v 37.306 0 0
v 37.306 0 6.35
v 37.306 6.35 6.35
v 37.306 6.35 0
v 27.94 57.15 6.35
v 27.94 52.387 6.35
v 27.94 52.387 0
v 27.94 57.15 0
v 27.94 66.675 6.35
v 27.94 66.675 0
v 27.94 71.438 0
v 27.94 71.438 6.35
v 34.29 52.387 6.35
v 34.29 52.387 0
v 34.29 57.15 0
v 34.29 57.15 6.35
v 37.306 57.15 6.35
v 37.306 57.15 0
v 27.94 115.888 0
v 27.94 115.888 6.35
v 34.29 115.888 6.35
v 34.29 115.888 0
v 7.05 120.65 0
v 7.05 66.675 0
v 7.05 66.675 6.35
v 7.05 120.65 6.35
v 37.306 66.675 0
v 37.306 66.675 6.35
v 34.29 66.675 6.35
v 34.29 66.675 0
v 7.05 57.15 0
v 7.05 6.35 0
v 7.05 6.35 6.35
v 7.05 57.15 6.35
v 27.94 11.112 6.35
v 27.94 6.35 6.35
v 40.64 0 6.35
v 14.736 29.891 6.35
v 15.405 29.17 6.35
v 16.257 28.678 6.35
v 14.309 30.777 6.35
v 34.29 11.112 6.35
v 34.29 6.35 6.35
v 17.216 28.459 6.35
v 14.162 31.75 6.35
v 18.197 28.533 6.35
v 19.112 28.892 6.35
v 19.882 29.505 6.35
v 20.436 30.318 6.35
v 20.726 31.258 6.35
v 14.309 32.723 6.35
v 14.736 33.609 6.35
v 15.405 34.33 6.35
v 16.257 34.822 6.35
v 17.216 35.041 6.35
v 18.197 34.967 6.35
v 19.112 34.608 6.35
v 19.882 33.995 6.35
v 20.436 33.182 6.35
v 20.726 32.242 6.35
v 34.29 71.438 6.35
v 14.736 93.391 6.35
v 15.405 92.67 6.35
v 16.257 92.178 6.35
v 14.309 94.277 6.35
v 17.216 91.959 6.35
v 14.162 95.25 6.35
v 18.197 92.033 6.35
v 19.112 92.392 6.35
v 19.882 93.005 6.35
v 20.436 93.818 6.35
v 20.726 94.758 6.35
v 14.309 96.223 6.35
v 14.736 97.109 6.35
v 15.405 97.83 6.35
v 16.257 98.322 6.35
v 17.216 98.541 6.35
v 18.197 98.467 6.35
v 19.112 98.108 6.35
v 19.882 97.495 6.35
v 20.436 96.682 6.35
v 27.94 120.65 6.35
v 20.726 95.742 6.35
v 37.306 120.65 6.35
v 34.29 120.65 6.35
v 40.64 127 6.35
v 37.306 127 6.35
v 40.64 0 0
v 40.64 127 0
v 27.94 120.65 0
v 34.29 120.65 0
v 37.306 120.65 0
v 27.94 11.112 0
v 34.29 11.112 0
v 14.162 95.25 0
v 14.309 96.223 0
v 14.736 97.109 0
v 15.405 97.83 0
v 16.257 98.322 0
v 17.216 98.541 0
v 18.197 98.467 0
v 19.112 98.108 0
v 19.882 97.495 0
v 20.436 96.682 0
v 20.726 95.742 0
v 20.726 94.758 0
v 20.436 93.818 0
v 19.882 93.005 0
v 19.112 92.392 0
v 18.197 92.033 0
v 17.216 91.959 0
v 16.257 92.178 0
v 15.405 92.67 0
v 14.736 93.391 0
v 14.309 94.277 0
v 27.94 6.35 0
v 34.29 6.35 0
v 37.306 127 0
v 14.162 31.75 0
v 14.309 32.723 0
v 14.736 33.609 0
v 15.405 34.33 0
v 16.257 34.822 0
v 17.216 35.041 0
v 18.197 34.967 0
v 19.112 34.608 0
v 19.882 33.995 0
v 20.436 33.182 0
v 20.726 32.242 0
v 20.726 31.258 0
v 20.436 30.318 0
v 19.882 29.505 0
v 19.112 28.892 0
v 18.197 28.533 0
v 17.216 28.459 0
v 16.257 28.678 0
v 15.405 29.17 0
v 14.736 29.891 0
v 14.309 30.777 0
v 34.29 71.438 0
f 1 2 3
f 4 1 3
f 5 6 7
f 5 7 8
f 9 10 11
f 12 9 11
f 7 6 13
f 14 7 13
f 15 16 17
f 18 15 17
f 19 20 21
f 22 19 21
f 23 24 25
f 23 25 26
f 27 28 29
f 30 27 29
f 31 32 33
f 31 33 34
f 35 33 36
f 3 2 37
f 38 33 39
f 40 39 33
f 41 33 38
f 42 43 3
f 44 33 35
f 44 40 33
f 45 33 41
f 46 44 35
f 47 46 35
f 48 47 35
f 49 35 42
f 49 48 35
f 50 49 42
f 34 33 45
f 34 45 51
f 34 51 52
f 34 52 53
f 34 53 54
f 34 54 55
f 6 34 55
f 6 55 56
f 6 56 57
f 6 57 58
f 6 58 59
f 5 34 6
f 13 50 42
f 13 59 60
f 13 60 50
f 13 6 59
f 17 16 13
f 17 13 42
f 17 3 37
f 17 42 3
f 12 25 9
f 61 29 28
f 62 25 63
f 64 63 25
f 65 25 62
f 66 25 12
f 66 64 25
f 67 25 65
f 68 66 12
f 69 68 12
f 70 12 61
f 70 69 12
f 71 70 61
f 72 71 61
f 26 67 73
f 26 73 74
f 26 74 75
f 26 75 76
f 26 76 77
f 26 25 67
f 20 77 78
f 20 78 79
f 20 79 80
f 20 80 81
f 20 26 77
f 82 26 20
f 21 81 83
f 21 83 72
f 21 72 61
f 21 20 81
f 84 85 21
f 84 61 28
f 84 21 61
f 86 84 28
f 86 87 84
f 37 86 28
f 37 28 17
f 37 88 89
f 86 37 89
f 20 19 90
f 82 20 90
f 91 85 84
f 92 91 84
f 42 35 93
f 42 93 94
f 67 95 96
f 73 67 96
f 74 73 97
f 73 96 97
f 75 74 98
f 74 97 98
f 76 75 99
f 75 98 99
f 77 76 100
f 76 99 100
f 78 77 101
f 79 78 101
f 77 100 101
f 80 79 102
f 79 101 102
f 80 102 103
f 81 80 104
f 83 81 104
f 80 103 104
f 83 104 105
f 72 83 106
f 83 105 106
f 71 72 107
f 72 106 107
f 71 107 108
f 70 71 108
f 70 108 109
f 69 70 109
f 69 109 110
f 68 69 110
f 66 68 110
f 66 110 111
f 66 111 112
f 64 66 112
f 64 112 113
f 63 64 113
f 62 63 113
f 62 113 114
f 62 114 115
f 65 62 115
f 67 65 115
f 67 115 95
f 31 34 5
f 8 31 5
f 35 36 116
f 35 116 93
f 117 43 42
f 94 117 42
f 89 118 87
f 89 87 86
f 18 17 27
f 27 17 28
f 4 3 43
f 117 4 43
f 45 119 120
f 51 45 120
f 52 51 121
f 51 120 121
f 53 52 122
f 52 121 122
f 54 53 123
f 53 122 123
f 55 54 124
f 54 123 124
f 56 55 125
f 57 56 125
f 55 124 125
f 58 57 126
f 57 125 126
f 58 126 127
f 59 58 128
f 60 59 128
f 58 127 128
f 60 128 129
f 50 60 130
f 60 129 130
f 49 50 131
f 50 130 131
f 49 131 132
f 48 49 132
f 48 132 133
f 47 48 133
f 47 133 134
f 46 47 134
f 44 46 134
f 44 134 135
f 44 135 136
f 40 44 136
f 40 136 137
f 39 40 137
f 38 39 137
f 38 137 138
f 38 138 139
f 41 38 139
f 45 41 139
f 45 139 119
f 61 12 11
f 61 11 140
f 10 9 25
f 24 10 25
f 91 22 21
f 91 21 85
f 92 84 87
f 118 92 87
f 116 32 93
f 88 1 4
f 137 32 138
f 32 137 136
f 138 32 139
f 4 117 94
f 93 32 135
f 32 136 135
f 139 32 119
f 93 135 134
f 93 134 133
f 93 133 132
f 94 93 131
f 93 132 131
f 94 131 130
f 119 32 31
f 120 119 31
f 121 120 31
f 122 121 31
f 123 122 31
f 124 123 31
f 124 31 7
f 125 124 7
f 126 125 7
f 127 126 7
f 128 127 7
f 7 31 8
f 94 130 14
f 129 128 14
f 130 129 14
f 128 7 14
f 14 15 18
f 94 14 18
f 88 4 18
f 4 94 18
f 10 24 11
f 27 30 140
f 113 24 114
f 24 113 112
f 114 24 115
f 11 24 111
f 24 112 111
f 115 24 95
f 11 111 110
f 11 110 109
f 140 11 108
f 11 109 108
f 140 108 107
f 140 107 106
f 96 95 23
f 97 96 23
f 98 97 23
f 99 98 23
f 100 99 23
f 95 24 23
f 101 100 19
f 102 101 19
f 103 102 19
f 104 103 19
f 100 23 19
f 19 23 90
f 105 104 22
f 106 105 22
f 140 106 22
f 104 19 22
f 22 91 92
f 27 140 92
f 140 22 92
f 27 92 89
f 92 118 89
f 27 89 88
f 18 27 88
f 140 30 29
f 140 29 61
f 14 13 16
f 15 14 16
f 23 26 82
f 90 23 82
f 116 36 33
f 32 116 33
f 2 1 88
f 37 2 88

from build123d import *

# Parameters (mm, degrees)
SKETCH2_W               = 40.64
SKETCH2_H               = 127
BOSS_EXTRUDE1_DEPTH     = 6.35
M6_CLEARANCE_HOLE1_D    = 6.6
CUT_EXTRUDE1_DEPTH      = 134.495063954
CUT_EXTRUDE1_DEPTH_BACK = 134.495063954
SKETCH5_W               = 7.0505
SKETCH5_H               = 127
SKETCH6_W               = 27.8745
SKETCH6_H               = 3.175
CUT_EXTRUDE2_DEPTH      = 134.495063954
SKETCH7_W               = 6.35
SKETCH7_H               = 4.7625
CUT_EXTRUDE3_DEPTH      = 134.495063954


with BuildPart() as part:
    # Sketch2 → Boss-Extrude1 (new body)
    with BuildSketch(Plane.XY):
        with Locations((20.32, 63.5)):
            Rectangle(SKETCH2_W, SKETCH2_H)
    extrude(amount=BOSS_EXTRUDE1_DEPTH)

    # M6 Clearance Hole1 (through all)
    with Locations(Plane.XY.offset(6.35)):
        with Locations((17.4625, 31.75), (17.4625, 95.25)):
            Hole(M6_CLEARANCE_HOLE1_D / 2)

    # Sketch5 → Cut-Extrude1 (cut, two sides: drawn at the far end of the back side and taken through both)
    with BuildSketch(Plane.XY.offset(6.35).offset(-CUT_EXTRUDE1_DEPTH_BACK)):
        with Locations((3.52525, 63.5)):
            Rectangle(SKETCH5_W, SKETCH5_H)
    extrude(amount=CUT_EXTRUDE1_DEPTH + CUT_EXTRUDE1_DEPTH_BACK, mode=Mode.SUBTRACT)

    # Sketch6 → Cut-Extrude2 (cut, through all)
    with BuildSketch(Plane.XY.offset(6.35)):
        Polygon((7.0505, 123.825), (7.0505, 120.65), (37.30625, 120.65), (37.30625, 127), (34.925, 127), (34.925, 123.825), align=None)
        with Locations((20.98775, 125.4125)):
            Rectangle(SKETCH6_W, SKETCH6_H)
        Polygon((37.30625, 66.675), (7.0505, 66.675), (7.0505, 63.5), (34.925, 63.5), (34.925, 60.325), (7.0505, 60.325), (7.0505, 57.15), (37.30625, 57.15), align=None)
        with Locations((20.98775, 61.9125)):
            Rectangle(SKETCH6_W, SKETCH6_H)
        Polygon((37.30625, 0), (37.30625, 6.35), (7.0505, 6.35), (7.0505, 3.175), (34.925, 3.175), (34.925, 0), align=None)
        with Locations((20.98775, 1.5875)):
            Rectangle(SKETCH6_W, SKETCH6_H)
    extrude(amount=-CUT_EXTRUDE2_DEPTH, mode=Mode.SUBTRACT)

    # Sketch7 → Cut-Extrude3 (cut, through all)
    with BuildSketch(Plane.XY.offset(6.35)):
        with Locations((31.115, 118.26875)):
            Rectangle(SKETCH7_W, SKETCH7_H)
        with Locations((31.115, 69.05625)):
            Rectangle(SKETCH7_W, SKETCH7_H)
        with Locations((31.115, 54.76875)):
            Rectangle(SKETCH7_W, SKETCH7_H)
        with Locations((31.115, 8.73125)):
            Rectangle(SKETCH7_W, SKETCH7_H)
    extrude(amount=-CUT_EXTRUDE3_DEPTH, mode=Mode.SUBTRACT)


solid = part.part
